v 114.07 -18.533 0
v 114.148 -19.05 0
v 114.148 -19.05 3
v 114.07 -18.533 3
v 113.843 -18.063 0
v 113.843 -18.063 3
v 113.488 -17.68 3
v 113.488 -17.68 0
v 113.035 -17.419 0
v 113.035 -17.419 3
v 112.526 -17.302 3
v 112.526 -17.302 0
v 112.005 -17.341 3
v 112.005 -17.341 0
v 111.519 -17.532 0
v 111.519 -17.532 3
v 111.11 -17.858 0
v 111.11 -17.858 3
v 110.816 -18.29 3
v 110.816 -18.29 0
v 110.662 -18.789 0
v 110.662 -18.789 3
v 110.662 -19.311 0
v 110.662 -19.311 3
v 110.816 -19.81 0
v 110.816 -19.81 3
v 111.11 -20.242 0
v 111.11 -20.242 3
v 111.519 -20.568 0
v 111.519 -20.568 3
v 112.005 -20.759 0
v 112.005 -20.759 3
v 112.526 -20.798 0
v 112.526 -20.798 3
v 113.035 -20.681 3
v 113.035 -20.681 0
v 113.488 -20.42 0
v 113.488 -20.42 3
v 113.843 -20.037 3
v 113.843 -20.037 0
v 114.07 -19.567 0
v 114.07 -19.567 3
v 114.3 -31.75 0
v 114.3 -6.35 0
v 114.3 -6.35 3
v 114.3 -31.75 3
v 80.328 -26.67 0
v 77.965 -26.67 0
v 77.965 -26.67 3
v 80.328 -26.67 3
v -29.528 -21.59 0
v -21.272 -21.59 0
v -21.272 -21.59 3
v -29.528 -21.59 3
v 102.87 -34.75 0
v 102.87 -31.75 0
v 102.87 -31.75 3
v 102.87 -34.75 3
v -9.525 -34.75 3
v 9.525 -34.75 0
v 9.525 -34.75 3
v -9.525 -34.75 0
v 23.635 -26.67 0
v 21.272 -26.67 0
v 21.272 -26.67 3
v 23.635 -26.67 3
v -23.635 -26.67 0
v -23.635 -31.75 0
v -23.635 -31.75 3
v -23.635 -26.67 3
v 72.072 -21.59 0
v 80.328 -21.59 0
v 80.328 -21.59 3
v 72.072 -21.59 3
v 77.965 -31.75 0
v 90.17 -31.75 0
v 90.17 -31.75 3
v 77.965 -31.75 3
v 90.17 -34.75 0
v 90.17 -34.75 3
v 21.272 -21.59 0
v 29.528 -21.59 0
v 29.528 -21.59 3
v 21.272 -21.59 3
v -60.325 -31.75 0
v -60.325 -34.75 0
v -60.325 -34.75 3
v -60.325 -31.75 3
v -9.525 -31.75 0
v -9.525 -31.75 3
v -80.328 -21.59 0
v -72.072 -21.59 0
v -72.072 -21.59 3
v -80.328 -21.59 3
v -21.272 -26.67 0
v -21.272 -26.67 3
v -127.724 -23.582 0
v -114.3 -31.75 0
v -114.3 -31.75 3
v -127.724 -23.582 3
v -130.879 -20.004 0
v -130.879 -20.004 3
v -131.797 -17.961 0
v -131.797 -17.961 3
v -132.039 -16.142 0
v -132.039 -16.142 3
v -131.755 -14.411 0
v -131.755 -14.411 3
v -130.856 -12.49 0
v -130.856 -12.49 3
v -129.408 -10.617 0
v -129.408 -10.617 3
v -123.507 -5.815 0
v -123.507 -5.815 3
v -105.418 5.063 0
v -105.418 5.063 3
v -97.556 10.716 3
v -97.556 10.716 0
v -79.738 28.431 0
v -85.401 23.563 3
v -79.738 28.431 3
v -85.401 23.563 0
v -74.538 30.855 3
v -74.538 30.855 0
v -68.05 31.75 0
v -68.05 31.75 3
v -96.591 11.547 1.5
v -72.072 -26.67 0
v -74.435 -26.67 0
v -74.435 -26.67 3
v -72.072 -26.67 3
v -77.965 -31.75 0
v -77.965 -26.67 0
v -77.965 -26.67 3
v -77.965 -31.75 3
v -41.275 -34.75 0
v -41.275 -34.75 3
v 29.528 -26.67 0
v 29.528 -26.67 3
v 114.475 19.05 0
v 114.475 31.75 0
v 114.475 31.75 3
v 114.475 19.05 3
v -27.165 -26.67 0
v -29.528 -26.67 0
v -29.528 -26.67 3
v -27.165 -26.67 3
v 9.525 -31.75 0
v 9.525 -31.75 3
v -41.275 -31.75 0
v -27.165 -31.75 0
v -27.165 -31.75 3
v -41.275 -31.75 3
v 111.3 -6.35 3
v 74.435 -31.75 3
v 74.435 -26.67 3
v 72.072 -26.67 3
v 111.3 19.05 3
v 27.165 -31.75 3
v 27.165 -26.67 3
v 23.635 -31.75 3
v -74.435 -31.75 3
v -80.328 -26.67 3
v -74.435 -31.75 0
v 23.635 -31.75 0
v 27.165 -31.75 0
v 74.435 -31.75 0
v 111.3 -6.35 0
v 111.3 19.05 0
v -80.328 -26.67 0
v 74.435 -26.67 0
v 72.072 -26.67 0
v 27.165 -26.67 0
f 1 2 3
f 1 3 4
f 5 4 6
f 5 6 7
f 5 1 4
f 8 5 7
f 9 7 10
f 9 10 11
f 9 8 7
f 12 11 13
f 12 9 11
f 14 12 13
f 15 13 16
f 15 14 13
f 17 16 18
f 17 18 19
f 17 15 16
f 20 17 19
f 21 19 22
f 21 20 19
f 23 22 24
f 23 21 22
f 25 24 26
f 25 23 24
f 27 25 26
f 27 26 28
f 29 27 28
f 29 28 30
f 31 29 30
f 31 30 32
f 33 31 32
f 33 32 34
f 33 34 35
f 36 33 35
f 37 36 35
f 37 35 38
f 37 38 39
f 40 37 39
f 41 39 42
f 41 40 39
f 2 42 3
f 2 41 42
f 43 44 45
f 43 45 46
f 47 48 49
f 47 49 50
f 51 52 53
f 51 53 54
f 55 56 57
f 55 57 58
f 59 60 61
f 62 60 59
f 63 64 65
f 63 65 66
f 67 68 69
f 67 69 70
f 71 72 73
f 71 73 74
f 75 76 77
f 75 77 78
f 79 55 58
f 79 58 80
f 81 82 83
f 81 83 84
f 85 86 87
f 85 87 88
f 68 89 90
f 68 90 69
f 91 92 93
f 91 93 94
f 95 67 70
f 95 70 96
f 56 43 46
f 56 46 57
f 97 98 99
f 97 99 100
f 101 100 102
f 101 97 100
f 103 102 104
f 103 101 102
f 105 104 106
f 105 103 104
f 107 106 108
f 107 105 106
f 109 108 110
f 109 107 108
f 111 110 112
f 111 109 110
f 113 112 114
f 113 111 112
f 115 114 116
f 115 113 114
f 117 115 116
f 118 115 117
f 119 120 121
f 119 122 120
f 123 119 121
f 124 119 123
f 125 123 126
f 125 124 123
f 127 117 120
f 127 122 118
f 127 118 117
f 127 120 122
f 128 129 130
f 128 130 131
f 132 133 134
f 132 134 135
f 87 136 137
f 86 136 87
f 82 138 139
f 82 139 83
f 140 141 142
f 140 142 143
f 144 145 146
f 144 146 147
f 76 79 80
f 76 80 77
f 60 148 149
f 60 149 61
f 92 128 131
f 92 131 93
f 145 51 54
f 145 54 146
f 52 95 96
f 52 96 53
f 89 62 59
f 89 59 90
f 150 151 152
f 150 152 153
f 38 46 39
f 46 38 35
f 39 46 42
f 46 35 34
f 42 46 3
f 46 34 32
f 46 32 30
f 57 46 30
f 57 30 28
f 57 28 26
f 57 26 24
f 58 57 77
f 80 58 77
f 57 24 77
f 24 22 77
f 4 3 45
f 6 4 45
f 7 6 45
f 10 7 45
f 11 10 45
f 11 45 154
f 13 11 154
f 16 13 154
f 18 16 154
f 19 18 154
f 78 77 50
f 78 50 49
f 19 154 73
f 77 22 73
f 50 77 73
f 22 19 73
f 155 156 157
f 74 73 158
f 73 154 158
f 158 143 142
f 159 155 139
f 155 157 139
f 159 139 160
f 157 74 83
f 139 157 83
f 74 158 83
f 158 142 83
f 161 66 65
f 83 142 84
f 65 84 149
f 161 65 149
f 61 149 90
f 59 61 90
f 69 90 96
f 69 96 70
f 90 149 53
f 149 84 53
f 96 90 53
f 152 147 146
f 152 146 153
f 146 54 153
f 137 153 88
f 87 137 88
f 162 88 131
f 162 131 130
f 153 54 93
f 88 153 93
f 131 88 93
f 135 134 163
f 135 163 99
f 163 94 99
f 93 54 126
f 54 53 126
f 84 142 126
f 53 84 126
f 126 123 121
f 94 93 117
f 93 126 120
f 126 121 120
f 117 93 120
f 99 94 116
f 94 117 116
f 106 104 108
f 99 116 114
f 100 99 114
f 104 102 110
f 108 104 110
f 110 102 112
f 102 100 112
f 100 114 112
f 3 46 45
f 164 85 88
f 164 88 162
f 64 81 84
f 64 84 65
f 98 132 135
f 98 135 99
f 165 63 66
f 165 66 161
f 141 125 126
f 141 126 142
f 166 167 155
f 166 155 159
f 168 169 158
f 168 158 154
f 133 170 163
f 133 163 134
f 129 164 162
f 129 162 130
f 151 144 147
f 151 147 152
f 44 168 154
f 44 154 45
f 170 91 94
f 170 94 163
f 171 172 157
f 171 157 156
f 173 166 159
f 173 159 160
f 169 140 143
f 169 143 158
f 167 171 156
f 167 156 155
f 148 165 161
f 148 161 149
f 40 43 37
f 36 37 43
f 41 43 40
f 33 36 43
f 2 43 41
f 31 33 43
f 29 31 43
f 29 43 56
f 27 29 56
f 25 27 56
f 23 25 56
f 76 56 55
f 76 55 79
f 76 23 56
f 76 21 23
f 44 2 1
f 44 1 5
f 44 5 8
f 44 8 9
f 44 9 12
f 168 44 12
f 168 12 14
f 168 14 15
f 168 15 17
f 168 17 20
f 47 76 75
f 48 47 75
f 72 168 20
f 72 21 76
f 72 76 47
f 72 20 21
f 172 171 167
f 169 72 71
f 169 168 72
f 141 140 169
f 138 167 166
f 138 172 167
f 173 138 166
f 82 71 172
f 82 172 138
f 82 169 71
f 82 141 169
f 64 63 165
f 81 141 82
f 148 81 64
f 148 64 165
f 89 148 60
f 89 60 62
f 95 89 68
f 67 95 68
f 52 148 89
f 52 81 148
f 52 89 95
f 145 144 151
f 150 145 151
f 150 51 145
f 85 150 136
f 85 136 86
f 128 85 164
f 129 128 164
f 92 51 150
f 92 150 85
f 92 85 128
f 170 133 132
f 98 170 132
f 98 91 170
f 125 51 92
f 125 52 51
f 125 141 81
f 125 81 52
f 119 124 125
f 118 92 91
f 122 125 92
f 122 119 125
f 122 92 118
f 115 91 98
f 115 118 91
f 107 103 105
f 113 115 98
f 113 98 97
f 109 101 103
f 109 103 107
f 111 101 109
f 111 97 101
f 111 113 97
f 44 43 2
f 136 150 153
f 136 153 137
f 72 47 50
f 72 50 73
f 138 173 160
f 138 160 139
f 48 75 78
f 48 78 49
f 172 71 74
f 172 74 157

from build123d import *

# Parameters (mm, degrees)
SKETCH1_R           = 1.7526
BOSS_EXTRUDE1_DEPTH = 3


with BuildPart() as part:
    # Sketch1 → Boss-Extrude1 (new body)
    with BuildSketch(Plane.XY):
        with BuildLine():
            Line((-68.050090825, 31.75), (111.125, 31.75))
            Line((111.125, 31.75), (114.475, 31.75))
            Line((114.475, 31.75), (114.475, 19.05))
            Line((114.475, 19.05), (111.3, 19.05))
            Line((111.3, 19.05), (111.3, -6.35))
            Line((111.3, -6.35), (114.3, -6.35))
            Line((114.3, -6.35), (114.3, -18.229405084))
            Line((114.3, -18.229405084), (114.3, -19.870594916))
            Line((114.3, -19.870594916), (114.3, -31.75))
            Line((114.3, -31.75), (111.125, -31.75))
            Line((111.125, -31.75), (102.87, -31.75))
            Line((102.87, -31.75), (102.87, -34.75))
            Line((102.87, -34.75), (90.17, -34.75))
            Line((90.17, -34.75), (90.17, -31.75))
            Line((90.17, -31.75), (88.19515, -31.75))
            Line((88.19515, -31.75), (77.9653, -31.75))
            Line((77.9653, -31.75), (77.9653, -26.67))
            Line((77.9653, -26.67), (80.3275, -26.67))
            Line((80.3275, -26.67), (80.3275, -21.59))
            Line((80.3275, -21.59), (72.0725, -21.59))
            Line((72.0725, -21.59), (72.0725, -26.67))
            Line((72.0725, -26.67), (74.4347, -26.67))
            Line((74.4347, -26.67), (74.4347, -31.75))
            Line((74.4347, -31.75), (27.1653, -31.75))
            Line((27.1653, -31.75), (27.1653, -26.67))
            Line((27.1653, -26.67), (29.5275, -26.67))
            Line((29.5275, -26.67), (29.5275, -21.59))
            Line((29.5275, -21.59), (21.2725, -21.59))
            Line((21.2725, -21.59), (21.2725, -26.67))
            Line((21.2725, -26.67), (23.6347, -26.67))
            Line((23.6347, -26.67), (23.6347, -31.75))
            Line((23.6347, -31.75), (9.525, -31.75))
            Line((9.525, -31.75), (9.525, -34.75))
            Line((9.525, -34.75), (-9.525, -34.75))
            Line((-9.525, -34.75), (-9.525, -31.75))
            Line((-9.525, -31.75), (-23.6347, -31.75))
            Line((-23.6347, -31.75), (-23.6347, -26.67))
            Line((-23.6347, -26.67), (-21.2725, -26.67))
            Line((-21.2725, -26.67), (-21.2725, -21.59))
            Line((-21.2725, -21.59), (-29.5275, -21.59))
            Line((-29.5275, -21.59), (-29.5275, -26.67))
            Line((-29.5275, -26.67), (-27.1653, -26.67))
            Line((-27.1653, -26.67), (-27.1653, -31.75))
            Line((-27.1653, -31.75), (-41.275, -31.75))
            Line((-41.275, -31.75), (-41.275, -34.75))
            Line((-41.275, -34.75), (-60.325, -34.75))
            Line((-60.325, -34.75), (-60.325, -31.75))
            Line((-60.325, -31.75), (-74.4347, -31.75))
            Line((-74.4347, -31.75), (-74.4347, -26.67))
            Line((-74.4347, -26.67), (-72.0725, -26.67))
            Line((-72.0725, -26.67), (-72.0725, -21.59))
            Line((-72.0725, -21.59), (-80.3275, -21.59))
            Line((-80.3275, -21.59), (-80.3275, -26.67))
            Line((-80.3275, -26.67), (-77.9653, -26.67))
            Line((-77.9653, -26.67), (-77.9653, -31.75))
            Line((-77.9653, -31.75), (-114.3, -31.75))
            add(Edge.make_bspline(
                [(-114.3, -31.75), (-155.042938789, -12.240400658), (-94.548851624, -1.377525337), (-82.535055103, 31.754341042), (-68.050090825, 31.75)],
                knots=[0, 0, 0, 0, 0.655069171, 1, 1, 1, 1], degree=3))
        make_face()
        with Locations((112.395, -19.05)):
            Circle(SKETCH1_R, mode=Mode.SUBTRACT)
    extrude(amount=BOSS_EXTRUDE1_DEPTH)


solid = part.part
